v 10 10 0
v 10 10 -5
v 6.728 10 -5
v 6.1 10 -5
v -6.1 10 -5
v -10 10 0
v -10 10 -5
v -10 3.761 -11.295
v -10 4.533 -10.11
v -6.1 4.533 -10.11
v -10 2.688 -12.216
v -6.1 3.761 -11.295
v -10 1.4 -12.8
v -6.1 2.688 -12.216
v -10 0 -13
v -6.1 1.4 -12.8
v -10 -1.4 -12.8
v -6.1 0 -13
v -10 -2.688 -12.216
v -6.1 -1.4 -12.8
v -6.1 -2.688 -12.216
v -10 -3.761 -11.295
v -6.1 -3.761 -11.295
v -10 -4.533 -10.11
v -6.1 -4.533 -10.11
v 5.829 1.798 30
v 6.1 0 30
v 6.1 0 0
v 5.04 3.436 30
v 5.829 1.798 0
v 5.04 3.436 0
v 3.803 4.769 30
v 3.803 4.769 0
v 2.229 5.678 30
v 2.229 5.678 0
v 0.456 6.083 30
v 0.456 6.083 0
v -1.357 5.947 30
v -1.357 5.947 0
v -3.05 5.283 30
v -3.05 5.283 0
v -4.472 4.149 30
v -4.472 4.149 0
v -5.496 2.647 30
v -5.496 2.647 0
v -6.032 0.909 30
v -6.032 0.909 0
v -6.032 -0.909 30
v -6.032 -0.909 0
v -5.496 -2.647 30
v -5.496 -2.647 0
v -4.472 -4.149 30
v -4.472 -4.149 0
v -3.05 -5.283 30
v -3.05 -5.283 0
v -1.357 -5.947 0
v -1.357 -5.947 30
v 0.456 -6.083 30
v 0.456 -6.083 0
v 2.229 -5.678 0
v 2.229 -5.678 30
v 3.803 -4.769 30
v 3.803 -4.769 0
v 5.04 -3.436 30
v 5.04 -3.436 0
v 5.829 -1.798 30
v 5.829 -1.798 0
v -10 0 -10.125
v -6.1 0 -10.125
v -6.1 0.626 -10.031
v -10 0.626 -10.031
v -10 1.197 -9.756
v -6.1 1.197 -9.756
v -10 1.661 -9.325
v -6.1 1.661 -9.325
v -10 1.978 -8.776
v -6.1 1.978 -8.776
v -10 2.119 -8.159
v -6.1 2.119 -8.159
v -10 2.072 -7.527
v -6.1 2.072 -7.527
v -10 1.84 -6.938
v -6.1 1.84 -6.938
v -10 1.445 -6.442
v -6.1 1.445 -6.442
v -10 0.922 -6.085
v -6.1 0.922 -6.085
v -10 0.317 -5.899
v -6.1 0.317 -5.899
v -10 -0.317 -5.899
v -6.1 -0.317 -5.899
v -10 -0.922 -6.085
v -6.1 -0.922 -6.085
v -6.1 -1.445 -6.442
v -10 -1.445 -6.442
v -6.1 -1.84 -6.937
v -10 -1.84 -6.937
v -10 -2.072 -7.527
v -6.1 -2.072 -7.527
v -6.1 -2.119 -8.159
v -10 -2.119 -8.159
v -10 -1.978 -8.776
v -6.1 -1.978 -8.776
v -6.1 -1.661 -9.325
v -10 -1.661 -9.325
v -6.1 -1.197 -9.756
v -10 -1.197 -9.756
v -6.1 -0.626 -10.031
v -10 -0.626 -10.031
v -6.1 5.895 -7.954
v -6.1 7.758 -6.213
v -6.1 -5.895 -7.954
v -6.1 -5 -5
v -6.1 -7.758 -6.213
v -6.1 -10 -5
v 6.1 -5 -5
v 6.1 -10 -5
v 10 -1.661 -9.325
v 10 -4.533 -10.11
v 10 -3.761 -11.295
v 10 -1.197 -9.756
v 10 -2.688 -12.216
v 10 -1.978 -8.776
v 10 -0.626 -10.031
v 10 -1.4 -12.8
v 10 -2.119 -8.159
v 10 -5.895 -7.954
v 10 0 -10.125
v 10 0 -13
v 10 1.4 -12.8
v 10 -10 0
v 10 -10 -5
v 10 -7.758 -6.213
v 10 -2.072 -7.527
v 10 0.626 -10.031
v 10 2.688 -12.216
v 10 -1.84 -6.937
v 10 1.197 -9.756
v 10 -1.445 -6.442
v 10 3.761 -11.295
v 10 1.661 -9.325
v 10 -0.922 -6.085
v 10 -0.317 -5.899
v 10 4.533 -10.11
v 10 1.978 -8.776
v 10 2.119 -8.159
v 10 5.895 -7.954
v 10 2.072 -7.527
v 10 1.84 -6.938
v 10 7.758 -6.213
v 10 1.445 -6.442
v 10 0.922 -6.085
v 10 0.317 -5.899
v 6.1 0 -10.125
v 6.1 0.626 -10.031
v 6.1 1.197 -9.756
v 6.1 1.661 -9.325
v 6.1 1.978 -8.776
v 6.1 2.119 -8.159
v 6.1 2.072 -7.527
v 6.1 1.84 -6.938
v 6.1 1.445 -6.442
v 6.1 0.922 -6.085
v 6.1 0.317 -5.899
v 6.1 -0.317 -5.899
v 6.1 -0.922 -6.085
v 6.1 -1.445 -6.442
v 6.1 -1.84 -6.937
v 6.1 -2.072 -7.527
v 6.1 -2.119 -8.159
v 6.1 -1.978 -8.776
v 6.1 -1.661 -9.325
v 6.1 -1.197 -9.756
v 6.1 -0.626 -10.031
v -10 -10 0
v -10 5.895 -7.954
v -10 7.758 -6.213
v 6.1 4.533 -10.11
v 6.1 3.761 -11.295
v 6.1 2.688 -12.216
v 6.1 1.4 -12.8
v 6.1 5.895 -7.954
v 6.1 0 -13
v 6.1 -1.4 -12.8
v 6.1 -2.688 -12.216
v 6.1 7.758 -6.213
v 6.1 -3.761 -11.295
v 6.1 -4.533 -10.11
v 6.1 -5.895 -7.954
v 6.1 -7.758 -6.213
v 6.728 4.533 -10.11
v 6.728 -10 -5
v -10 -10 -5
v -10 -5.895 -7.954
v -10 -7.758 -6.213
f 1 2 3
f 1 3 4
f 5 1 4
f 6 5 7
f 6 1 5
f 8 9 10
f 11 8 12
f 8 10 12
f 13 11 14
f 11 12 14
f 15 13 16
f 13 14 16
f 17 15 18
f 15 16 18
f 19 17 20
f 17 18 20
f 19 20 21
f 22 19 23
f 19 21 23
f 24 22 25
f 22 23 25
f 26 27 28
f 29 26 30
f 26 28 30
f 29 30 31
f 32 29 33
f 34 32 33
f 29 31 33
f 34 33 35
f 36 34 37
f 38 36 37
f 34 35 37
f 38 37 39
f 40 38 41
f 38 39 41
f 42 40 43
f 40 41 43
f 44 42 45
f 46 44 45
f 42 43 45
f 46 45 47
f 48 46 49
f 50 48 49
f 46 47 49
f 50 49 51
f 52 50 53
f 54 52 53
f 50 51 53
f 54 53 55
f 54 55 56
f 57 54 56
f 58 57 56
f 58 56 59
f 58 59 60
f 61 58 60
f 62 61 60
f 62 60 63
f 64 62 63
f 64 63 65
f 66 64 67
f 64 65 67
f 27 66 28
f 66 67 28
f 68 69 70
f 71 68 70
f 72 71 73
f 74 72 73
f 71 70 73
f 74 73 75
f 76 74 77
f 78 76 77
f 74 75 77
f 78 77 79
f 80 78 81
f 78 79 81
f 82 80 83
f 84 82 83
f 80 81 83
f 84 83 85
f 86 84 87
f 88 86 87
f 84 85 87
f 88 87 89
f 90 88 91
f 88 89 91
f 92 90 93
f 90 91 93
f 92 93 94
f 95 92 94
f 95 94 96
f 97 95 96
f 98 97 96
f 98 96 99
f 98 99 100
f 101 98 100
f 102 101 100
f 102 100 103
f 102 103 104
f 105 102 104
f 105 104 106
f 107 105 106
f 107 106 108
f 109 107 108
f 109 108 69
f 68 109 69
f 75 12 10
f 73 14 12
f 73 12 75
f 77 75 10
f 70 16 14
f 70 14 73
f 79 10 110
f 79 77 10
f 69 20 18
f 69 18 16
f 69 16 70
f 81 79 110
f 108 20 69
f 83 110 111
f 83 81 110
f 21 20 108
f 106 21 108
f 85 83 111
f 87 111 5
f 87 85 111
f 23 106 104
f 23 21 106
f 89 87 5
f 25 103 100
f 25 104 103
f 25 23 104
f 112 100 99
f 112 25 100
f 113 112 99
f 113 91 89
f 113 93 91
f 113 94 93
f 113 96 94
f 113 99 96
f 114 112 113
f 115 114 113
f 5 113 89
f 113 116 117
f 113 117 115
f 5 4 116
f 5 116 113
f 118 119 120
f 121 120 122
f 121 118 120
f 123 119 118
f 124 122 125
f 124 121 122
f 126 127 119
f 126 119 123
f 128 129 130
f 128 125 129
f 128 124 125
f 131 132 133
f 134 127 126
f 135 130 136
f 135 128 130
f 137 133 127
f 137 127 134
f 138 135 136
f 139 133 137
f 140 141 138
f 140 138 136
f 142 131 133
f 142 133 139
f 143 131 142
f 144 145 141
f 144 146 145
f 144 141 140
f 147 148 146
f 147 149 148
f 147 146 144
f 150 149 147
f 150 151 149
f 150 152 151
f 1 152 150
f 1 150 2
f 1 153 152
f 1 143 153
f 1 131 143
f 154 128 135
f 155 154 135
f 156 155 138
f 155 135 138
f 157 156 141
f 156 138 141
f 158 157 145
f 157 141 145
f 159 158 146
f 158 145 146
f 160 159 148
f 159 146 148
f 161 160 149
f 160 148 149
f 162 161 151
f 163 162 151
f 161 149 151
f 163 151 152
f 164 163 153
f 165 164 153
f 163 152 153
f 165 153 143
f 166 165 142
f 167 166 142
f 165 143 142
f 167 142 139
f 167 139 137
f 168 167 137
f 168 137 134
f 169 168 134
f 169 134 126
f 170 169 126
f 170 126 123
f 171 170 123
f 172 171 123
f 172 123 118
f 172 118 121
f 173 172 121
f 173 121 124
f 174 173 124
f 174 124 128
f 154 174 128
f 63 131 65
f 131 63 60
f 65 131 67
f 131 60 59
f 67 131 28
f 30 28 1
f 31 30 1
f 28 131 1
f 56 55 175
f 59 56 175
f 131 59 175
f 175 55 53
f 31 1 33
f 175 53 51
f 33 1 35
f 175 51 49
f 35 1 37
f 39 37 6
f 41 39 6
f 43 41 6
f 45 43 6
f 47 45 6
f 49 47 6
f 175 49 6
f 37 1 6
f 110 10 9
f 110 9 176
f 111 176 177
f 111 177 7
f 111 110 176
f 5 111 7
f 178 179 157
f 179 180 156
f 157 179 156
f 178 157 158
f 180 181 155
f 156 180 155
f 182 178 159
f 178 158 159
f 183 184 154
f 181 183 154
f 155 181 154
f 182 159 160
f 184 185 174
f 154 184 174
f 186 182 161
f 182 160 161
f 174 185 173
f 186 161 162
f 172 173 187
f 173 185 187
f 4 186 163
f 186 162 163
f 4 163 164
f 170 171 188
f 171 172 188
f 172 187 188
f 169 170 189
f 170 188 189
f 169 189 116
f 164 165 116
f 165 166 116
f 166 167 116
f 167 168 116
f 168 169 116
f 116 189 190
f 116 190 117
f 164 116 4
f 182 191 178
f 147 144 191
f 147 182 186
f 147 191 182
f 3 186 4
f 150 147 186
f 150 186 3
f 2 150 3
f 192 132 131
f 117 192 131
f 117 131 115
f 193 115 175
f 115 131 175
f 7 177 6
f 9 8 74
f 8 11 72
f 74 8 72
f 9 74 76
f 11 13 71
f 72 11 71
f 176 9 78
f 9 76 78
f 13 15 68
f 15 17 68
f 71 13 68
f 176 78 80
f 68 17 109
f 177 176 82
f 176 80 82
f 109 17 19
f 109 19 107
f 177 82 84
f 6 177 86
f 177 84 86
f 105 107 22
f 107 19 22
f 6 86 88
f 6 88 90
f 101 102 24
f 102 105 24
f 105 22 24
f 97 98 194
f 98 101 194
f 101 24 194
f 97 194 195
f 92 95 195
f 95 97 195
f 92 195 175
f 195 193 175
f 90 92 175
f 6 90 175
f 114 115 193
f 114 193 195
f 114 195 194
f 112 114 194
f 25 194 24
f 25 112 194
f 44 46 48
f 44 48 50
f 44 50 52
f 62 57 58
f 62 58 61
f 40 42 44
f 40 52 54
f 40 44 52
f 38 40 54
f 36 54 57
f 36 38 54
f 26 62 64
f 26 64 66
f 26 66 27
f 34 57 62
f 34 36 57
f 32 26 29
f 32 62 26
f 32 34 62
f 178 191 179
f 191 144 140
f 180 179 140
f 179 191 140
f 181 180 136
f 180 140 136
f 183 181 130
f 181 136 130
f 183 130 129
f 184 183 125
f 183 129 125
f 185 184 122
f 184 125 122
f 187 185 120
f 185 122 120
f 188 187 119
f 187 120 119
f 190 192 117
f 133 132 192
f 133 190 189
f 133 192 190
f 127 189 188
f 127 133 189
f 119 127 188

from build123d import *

# Parameters (mm, degrees)
SKETCH2_R               = 6.1
BOSS_EXTRUDE1_DEPTH     = 30
SKETCH3_W               = 20
SKETCH3_H               = 20
BOSS_EXTRUDE2_DEPTH     = 5
SKETCH4_R               = 2.125
BOSS_EXTRUDE3_DEPTH     = 20
CUT_EXTRUDE1_DEPTH      = 20
CUT_EXTRUDE1_DEPTH_BACK = 20
SKETCH5_W               = 12.2
SKETCH5_H               = 16
FILLET2_R               = 10


with BuildPart() as part:
    # Sketch2 → Boss-Extrude1 (new body)
    with BuildSketch(Plane.XY):
        Circle(SKETCH2_R)
    extrude(amount=BOSS_EXTRUDE1_DEPTH)

    # Sketch3 → Boss-Extrude2 (add)
    with BuildSketch(Plane(origin=(0, 0, 0), x_dir=(-1, 0, 0), z_dir=(0, 0, -1))):
        Rectangle(SKETCH3_W, SKETCH3_H)
    extrude(amount=BOSS_EXTRUDE2_DEPTH)

    # Sketch4 → Boss-Extrude3 (add)
    with BuildSketch(Plane(origin=(10, 0, 0), x_dir=(0, 0, -1), z_dir=(1, 0, 0))):
        with BuildLine():
            Line((5, 0), (5, 5))
            Line((5, 5), (8, 5))
            ThreePointArc((8, 5), (13, 0), (8, -5))
            Line((8, -5), (5, -5))
            Line((5, -5), (5, 0))
        make_face()
        with Locations((8, 0)):
            Circle(SKETCH4_R, mode=Mode.SUBTRACT)
    extrude(amount=-BOSS_EXTRUDE3_DEPTH)

    # Sketch5 → Cut-Extrude1 (cut, two sides: drawn at the far end of the back side and taken through both)
    with BuildSketch(Plane(origin=(0, 0, 0), x_dir=(1, 0, 0), z_dir=(0, 1, 0)).offset(-CUT_EXTRUDE1_DEPTH_BACK)):
        with Locations((0, 13)):
            Rectangle(SKETCH5_W, SKETCH5_H)
    extrude(amount=CUT_EXTRUDE1_DEPTH + CUT_EXTRUDE1_DEPTH_BACK, mode=Mode.SUBTRACT)

    # Fillet2
    # the kernel refuses this fillet: 10 mm, written as the material it adds along each edge
    with BuildSketch(Plane(origin=(6.728171707, 5, -5), x_dir=(0, -0.09101222312672333, -0.9958497754388116), z_dir=(-1, 0, 0))) as fillet2_piece_1_section:
        with BuildLine():
            CenterArc((8.508585165, -9.412424416), FILLET2_R, 109.738733942, 43.945519562)
            Line((-0.455061116, -4.979248877), (-1.351425744, -4.535931323))
            ThreePointArc((-1.351425744, -4.535931323), (-1.223380333, -2.398612215), (-0.995849775, 0.091012223))
            Line((-0.995849775, 0.091012223), (0.091012223, 0.995849775))
            ThreePointArc((0.091012223, 0.995849775), (3.078561549, 0.722813106), (4.793537035, 0.941242442))
            Line((4.793537035, 0.941242442), (5.131268683, 0))
        make_face()
    fillet2_piece_1 = extrude(amount=16.728171707, mode=Mode.PRIVATE)
    fillet2_piece_1 = split(fillet2_piece_1, bisect_by=Plane(origin=(6.1, 6.116270273, -6.110221206), z_dir=(1, 0, 0)), keep=Keep.TOP, mode=Mode.PRIVATE)
    add(fillet2_piece_1)
    with BuildSketch(Plane(origin=(-6.1, 5, -5), x_dir=(0, -0.09101222312672332, -0.9958497754388116), z_dir=(-1, 0, 0))) as fillet2_piece_2:
        with BuildLine():
            CenterArc((8.508585165, -9.412424416), FILLET2_R, 109.738733942, 43.945519562)
            Line((-0.455061116, -4.979248877), (-1.351425744, -4.535931323))
            ThreePointArc((-1.351425744, -4.535931323), (-1.223380333, -2.398612215), (-0.995849775, 0.091012223))
            Line((-0.995849775, 0.091012223), (0.091012223, 0.995849775))
            ThreePointArc((0.091012223, 0.995849775), (3.078561549, 0.722813106), (4.793537035, 0.941242442))
            Line((4.793537035, 0.941242442), (5.131268683, 0))
        make_face()
    extrude(amount=3.9)
    with BuildSketch(Plane(origin=(10, 5, -5), x_dir=(0, 1, 0), z_dir=(-1, 0, 0))) as fillet2_piece_3:
        with BuildLine():
            CenterArc((8.598975489, 9.329918297), FILLET2_R, 204.960576151, 43.945519562)
            Line((-0.46700817, 5.109972766), (-1.373606536, 4.687978213))
            ThreePointArc((-1.373606536, 4.687978213), (-1, 3), (-1, 0))
            Line((-1, 0), (0, -1))
            ThreePointArc((0, -1), (2.5, -1), (4.640102451, -0.93299183))
            Line((4.640102451, -0.93299183), (5, 0))
        make_face()
    extrude(amount=3.9)
    with BuildSketch(Plane(origin=(10, 5, -5), x_dir=(0, 1, 0), z_dir=(-1, 0, 0))) as fillet2_piece_4_section:
        with BuildLine():
            CenterArc((8.598975489, 9.329918297), FILLET2_R, 204.960576151, 43.945519562)
            Line((-0.46700817, 5.109972766), (-1.373606536, 4.687978213))
            ThreePointArc((-1.373606536, 4.687978213), (-1, 3), (-1, 0))
            Line((-1, 0), (0, -1))
            ThreePointArc((0, -1), (2.5, -1), (4.640102451, -0.93299183))
            Line((4.640102451, -0.93299183), (5, 0))
        make_face()
    fillet2_piece_4 = extrude(amount=16.728171707, mode=Mode.PRIVATE)
    fillet2_piece_4 = split(fillet2_piece_4, bisect_by=Plane(origin=(-6.1, 6.116270273, -6.110221206), z_dir=(-1, 0, 0)), keep=Keep.TOP, mode=Mode.PRIVATE)
    add(fillet2_piece_4)
    with BuildSketch(Plane(origin=(6.728171707, -5, -5), x_dir=(0, 0.0910122231267235, -0.9958497754388116), z_dir=(-1, 0, 0))) as fillet2_piece_5_section:
        with BuildLine():
            CenterArc((8.508585165, 9.412424416), FILLET2_R, 206.315746496, 43.945519562)
            Line((-0.455061116, 4.979248877), (-1.351425744, 4.535931323))
            ThreePointArc((-1.351425744, 4.535931323), (-1.223380333, 2.398612215), (-0.995849775, -0.091012223))
            Line((-0.995849775, -0.091012223), (0.091012223, -0.995849775))
            ThreePointArc((0.091012223, -0.995849775), (3.078561549, -0.722813106), (4.793537035, -0.941242442))
            Line((4.793537035, -0.941242442), (5.131268683, 0))
        make_face()
    fillet2_piece_5 = extrude(amount=16.728171707, mode=Mode.PRIVATE)
    fillet2_piece_5 = split(fillet2_piece_5, bisect_by=Plane(origin=(6.1, -6.116270273, -6.110221206), z_dir=(1, 0, 0)), keep=Keep.TOP, mode=Mode.PRIVATE)
    add(fillet2_piece_5)
    with BuildSketch(Plane(origin=(-6.1, -5, -5), x_dir=(0, 0.0910122231267235, -0.9958497754388116), z_dir=(-1, 0, 0))) as fillet2_piece_6:
        with BuildLine():
            CenterArc((8.508585165, 9.412424416), FILLET2_R, 206.315746496, 43.945519562)
            Line((-0.455061116, 4.979248877), (-1.351425744, 4.535931323))
            ThreePointArc((-1.351425744, 4.535931323), (-1.223380333, 2.398612215), (-0.995849775, -0.091012223))
            Line((-0.995849775, -0.091012223), (0.091012223, -0.995849775))
            ThreePointArc((0.091012223, -0.995849775), (3.078561549, -0.722813106), (4.793537035, -0.941242442))
            Line((4.793537035, -0.941242442), (5.131268683, 0))
        make_face()
    extrude(amount=3.9)
    with BuildSketch(Plane(origin=(10, -5, -5), x_dir=(0, -1, 0), z_dir=(-1, 0, 0))) as fillet2_piece_7:
        with BuildLine():
            CenterArc((8.598975489, -9.329918297), FILLET2_R, 111.093904287, 43.945519562)
            Line((-0.46700817, -5.109972766), (-1.373606536, -4.687978213))
            ThreePointArc((-1.373606536, -4.687978213), (-1, -3), (-1, 0))
            Line((-1, 0), (0, 1))
            ThreePointArc((0, 1), (2.5, 1), (4.640102451, 0.93299183))
            Line((4.640102451, 0.93299183), (5, 0))
        make_face()
    extrude(amount=3.9)
    with BuildSketch(Plane(origin=(10, -5, -5), x_dir=(0, -1, 0), z_dir=(-1, 0, 0))) as fillet2_piece_8_section:
        with BuildLine():
            CenterArc((8.598975489, -9.329918297), FILLET2_R, 111.093904287, 43.945519562)
            Line((-0.46700817, -5.109972766), (-1.373606536, -4.687978213))
            ThreePointArc((-1.373606536, -4.687978213), (-1, -3), (-1, 0))
            Line((-1, 0), (0, 1))
            ThreePointArc((0, 1), (2.5, 1), (4.640102451, 0.93299183))
            Line((4.640102451, 0.93299183), (5, 0))
        make_face()
    fillet2_piece_8 = extrude(amount=16.728171707, mode=Mode.PRIVATE)
    fillet2_piece_8 = split(fillet2_piece_8, bisect_by=Plane(origin=(-6.1, -6.116270273, -6.110221206), z_dir=(-1, 0, 0)), keep=Keep.TOP, mode=Mode.PRIVATE)
    add(fillet2_piece_8)


solid = part.part
